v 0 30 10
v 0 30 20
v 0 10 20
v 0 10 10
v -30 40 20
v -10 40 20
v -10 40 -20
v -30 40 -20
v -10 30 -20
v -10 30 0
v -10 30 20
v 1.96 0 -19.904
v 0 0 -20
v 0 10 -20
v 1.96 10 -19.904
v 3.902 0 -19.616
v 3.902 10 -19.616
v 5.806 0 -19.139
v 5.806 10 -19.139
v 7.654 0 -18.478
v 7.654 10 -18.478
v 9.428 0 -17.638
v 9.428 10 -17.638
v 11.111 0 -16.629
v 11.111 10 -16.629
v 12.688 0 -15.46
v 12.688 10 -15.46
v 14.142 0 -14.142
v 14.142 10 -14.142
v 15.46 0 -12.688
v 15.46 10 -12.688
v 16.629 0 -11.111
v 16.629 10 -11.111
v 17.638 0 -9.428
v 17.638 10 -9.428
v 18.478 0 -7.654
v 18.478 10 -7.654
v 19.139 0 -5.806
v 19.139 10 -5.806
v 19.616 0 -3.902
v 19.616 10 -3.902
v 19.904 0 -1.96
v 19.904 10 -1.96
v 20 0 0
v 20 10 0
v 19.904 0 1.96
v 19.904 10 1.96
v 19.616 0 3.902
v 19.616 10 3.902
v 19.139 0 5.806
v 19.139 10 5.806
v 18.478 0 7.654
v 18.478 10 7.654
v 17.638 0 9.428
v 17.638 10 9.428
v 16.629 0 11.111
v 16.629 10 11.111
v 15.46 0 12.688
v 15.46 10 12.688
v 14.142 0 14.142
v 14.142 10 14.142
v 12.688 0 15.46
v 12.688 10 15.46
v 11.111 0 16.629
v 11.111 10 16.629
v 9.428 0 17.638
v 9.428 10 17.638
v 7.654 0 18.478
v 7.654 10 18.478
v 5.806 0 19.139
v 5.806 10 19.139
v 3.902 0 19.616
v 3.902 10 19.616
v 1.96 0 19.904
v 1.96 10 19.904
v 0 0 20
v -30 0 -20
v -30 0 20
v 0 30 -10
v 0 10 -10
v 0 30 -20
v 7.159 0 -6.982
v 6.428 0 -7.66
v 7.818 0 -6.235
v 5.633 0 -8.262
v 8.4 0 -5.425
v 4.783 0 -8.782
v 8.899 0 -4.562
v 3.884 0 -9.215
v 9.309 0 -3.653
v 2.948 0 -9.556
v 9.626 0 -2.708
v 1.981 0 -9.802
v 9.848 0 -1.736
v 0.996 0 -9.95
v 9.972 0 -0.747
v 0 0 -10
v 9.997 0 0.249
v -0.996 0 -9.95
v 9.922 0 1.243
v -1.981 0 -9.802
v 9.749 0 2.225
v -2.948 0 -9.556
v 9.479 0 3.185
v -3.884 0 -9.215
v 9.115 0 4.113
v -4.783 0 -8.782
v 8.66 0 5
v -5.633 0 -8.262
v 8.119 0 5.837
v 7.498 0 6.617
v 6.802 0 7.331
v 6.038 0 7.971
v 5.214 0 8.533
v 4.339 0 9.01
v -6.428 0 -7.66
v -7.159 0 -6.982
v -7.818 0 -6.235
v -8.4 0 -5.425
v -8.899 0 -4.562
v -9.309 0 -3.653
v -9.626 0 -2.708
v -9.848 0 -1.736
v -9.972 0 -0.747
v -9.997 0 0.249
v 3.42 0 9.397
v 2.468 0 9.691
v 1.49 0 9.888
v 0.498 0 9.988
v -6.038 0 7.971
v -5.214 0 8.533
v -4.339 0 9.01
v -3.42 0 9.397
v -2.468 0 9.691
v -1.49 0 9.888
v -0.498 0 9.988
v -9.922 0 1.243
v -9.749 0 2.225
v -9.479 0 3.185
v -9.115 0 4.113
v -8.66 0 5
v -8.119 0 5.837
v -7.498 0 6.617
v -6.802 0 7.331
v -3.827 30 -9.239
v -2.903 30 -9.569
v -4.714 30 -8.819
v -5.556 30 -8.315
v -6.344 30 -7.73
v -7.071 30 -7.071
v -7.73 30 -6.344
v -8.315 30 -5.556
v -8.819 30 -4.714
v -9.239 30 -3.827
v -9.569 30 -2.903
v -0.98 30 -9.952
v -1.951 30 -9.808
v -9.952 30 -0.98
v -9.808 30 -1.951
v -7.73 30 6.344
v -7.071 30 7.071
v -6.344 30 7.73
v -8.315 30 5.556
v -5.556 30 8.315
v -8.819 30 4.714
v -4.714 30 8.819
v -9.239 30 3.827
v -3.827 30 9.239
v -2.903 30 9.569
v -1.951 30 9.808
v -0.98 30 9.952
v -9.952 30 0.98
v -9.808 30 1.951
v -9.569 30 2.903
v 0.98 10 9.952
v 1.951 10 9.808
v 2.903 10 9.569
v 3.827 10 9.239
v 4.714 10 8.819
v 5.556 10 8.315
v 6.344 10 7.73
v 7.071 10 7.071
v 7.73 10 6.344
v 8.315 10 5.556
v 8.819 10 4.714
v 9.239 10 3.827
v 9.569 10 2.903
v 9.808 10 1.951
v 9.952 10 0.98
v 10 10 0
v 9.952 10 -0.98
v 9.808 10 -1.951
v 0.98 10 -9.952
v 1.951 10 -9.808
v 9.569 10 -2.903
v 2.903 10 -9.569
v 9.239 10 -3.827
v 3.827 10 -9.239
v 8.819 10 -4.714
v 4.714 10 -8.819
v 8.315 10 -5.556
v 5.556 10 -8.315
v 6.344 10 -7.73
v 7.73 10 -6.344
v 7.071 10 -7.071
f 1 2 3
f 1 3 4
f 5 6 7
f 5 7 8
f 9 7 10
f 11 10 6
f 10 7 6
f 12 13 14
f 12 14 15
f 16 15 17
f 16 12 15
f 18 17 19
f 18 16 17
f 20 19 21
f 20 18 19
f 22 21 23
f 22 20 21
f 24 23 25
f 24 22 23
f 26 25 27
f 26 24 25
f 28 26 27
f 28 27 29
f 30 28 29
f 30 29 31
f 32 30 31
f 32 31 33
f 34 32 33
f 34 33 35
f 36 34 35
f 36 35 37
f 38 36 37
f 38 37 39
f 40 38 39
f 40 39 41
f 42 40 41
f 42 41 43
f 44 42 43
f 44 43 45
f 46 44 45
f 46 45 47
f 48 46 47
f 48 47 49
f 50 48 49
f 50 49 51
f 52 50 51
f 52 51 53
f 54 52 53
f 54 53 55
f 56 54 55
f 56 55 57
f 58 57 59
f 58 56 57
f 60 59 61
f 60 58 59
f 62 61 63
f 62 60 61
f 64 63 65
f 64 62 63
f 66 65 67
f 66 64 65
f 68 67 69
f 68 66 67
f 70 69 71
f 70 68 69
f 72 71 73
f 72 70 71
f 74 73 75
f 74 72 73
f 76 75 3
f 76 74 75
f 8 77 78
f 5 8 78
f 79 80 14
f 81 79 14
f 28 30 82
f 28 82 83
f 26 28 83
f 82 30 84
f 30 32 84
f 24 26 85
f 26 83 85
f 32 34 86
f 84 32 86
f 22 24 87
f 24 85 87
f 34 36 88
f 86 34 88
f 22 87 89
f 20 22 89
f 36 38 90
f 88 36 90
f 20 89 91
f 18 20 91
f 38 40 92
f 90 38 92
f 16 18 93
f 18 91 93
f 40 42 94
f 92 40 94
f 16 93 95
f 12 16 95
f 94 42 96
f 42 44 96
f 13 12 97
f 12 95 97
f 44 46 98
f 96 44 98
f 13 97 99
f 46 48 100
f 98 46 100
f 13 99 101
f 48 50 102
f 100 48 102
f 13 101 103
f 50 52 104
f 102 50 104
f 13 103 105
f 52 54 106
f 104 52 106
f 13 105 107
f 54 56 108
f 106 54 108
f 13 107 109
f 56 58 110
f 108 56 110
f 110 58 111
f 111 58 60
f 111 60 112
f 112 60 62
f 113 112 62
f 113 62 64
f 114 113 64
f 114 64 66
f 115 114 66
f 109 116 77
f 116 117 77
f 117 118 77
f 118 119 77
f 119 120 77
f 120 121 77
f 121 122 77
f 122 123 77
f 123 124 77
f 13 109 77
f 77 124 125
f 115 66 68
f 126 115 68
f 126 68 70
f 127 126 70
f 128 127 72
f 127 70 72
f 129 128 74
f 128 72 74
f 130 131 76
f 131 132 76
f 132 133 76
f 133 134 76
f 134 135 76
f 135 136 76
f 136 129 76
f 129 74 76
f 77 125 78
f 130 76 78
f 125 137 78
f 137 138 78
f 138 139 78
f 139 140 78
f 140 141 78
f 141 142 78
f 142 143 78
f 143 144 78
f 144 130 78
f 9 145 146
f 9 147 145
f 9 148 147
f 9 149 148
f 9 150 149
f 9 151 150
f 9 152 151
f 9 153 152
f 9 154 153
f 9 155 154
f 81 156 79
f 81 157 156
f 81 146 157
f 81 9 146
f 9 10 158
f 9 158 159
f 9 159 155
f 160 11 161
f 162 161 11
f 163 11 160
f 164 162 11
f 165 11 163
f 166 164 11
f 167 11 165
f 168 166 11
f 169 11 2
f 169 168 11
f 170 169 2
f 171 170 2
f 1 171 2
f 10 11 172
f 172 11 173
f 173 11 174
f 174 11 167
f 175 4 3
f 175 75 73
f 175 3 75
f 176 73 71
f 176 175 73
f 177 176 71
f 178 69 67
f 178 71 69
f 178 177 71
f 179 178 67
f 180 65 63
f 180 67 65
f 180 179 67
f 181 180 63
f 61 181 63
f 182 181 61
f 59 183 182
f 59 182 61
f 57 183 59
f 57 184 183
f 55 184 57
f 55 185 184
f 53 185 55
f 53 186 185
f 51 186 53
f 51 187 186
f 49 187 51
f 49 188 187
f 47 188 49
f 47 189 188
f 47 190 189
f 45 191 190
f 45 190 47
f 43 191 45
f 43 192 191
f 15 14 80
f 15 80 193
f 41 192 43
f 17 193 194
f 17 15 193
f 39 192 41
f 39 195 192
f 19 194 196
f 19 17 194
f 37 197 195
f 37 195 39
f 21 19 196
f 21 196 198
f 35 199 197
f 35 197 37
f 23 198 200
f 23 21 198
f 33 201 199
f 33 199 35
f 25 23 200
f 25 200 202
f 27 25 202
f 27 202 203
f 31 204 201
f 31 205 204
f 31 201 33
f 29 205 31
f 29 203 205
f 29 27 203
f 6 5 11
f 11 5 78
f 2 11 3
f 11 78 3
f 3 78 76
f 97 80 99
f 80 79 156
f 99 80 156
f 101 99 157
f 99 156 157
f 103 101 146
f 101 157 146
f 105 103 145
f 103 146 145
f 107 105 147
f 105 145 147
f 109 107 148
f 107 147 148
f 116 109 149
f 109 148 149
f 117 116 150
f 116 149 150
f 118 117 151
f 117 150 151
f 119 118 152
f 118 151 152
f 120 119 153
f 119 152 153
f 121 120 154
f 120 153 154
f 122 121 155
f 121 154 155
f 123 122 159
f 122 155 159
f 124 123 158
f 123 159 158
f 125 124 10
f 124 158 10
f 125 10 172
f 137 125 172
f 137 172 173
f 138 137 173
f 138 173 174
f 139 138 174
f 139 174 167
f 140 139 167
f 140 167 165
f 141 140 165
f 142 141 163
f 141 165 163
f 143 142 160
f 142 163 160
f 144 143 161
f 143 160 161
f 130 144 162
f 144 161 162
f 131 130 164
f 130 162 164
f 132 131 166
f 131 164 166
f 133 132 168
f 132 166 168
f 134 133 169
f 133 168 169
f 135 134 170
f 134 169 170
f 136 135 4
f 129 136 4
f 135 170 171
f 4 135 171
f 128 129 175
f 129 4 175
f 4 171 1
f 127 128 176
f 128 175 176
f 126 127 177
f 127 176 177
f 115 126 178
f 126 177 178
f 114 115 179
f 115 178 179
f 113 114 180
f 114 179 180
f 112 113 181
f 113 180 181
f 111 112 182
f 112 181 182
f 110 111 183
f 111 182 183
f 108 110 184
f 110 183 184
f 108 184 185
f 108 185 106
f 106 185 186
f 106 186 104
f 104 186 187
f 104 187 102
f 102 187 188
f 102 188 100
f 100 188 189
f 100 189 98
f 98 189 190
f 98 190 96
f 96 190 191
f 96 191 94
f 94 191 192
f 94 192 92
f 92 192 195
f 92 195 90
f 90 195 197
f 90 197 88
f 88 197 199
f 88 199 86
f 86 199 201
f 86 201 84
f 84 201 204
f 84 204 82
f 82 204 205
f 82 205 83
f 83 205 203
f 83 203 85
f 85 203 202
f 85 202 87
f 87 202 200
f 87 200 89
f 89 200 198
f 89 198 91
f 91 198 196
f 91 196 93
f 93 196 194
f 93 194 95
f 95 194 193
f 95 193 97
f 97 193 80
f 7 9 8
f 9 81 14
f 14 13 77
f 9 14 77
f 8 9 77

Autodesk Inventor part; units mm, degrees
ref_plane "YZ Plane" through (0, 0, 0) normal (1, 0, 0) x (0, 1, 0)
ref_plane "XZ Plane" through (0, 0, 0) normal (0, 1, 0) x (-1, 0, 0)
ref_plane "XY Plane" through (0, 0, 0) normal (0, 0, 1) x (1, 0, 0)
sketch "草圖1" plane through (0, 0, 0) normal (0, 1, 0) x (-1, 0, 0)
  circle A0 centre (0, 0) radius 20
  line L0 (0, -20) -> (30, -20)
  line L1 (30, -20) -> (30, 20)
  line L2 (30, 20) -> (0, 20)
  line L3 (0, 20) -> (0, -20)
  point P0 (0, 20)
  dimension "d0" = 40
  dimension "d1" = 30
extrude "擠出1" add sketch "草圖1" along normal blind 40
sketch "草圖2" plane through (0, 40, 0) normal (0, 1, 0) x (1, 0, 0)
  line L0 (-30, 20) -> (0, 20) projected
  arc A0 (0, -20) -> (0, 20) centre (0, 0) ccw projected
  line L1 (0, -20) -> (-30, -20) projected
  line L2 (-30, -20) -> (-30, 20) projected
  line L3 (0, 27.0691) -> (-10, 27.0691)
  line L4 (-10, 27.0691) -> (-10, -29.9758)
  line L5 (-10, -29.9758) -> (0, -29.9758)
  line L6 (0, -29.9758) -> (0, 27.0691)
  dimension "d4" = 20
  dimension "d5" = 10
extrude "擠出2" cut sketch "草圖2" against normal blind 10 contours L4 L3 L6 L0 | L0 L6 L1 L4 | L1 L6 L5 L4
sketch "草圖3" plane through (0, 40, 0) normal (0, 1, 0) x (1, 0, 0)
  line L0 (0, -20) -> (0, 20) projected
  arc A0 (0, -20) -> (0, 20) centre (0, 0) ccw projected
  line L1 (-10, 20) -> (-10, -20) projected
  line L2 (-10, -20) -> (-30, -20) projected
  line L3 (-30, -20) -> (-30, 20) projected
  line L4 (-30, 20) -> (-10, 20) projected
  line L5 (0, -34.6108) -> (30.5971, -34.6108)
  line L6 (30.5971, -34.6108) -> (30.5971, 28.6775)
  line L7 (30.5971, 28.6775) -> (0, 28.6775)
  line L8 (0, 28.6775) -> (0, -34.6108)
  line L9 (0, 20) -> (0, -20) projected
extrude "擠出3" cut sketch "草圖3" against normal blind 30 contours L0 A0 | A0 L8 L7 L6 L5
sketch "草圖4" plane through (0, 0, 0) normal (0, -1, 0) x (1, 0, 0)
  arc A0 (0, -20) -> (0, 20) centre (0, 0) ccw projected
hole "孔1" at (0, 0, 0) direction (0, 1, 0) diameter 20 end through all
properties part number "34" material "鋼、碳鋼"
